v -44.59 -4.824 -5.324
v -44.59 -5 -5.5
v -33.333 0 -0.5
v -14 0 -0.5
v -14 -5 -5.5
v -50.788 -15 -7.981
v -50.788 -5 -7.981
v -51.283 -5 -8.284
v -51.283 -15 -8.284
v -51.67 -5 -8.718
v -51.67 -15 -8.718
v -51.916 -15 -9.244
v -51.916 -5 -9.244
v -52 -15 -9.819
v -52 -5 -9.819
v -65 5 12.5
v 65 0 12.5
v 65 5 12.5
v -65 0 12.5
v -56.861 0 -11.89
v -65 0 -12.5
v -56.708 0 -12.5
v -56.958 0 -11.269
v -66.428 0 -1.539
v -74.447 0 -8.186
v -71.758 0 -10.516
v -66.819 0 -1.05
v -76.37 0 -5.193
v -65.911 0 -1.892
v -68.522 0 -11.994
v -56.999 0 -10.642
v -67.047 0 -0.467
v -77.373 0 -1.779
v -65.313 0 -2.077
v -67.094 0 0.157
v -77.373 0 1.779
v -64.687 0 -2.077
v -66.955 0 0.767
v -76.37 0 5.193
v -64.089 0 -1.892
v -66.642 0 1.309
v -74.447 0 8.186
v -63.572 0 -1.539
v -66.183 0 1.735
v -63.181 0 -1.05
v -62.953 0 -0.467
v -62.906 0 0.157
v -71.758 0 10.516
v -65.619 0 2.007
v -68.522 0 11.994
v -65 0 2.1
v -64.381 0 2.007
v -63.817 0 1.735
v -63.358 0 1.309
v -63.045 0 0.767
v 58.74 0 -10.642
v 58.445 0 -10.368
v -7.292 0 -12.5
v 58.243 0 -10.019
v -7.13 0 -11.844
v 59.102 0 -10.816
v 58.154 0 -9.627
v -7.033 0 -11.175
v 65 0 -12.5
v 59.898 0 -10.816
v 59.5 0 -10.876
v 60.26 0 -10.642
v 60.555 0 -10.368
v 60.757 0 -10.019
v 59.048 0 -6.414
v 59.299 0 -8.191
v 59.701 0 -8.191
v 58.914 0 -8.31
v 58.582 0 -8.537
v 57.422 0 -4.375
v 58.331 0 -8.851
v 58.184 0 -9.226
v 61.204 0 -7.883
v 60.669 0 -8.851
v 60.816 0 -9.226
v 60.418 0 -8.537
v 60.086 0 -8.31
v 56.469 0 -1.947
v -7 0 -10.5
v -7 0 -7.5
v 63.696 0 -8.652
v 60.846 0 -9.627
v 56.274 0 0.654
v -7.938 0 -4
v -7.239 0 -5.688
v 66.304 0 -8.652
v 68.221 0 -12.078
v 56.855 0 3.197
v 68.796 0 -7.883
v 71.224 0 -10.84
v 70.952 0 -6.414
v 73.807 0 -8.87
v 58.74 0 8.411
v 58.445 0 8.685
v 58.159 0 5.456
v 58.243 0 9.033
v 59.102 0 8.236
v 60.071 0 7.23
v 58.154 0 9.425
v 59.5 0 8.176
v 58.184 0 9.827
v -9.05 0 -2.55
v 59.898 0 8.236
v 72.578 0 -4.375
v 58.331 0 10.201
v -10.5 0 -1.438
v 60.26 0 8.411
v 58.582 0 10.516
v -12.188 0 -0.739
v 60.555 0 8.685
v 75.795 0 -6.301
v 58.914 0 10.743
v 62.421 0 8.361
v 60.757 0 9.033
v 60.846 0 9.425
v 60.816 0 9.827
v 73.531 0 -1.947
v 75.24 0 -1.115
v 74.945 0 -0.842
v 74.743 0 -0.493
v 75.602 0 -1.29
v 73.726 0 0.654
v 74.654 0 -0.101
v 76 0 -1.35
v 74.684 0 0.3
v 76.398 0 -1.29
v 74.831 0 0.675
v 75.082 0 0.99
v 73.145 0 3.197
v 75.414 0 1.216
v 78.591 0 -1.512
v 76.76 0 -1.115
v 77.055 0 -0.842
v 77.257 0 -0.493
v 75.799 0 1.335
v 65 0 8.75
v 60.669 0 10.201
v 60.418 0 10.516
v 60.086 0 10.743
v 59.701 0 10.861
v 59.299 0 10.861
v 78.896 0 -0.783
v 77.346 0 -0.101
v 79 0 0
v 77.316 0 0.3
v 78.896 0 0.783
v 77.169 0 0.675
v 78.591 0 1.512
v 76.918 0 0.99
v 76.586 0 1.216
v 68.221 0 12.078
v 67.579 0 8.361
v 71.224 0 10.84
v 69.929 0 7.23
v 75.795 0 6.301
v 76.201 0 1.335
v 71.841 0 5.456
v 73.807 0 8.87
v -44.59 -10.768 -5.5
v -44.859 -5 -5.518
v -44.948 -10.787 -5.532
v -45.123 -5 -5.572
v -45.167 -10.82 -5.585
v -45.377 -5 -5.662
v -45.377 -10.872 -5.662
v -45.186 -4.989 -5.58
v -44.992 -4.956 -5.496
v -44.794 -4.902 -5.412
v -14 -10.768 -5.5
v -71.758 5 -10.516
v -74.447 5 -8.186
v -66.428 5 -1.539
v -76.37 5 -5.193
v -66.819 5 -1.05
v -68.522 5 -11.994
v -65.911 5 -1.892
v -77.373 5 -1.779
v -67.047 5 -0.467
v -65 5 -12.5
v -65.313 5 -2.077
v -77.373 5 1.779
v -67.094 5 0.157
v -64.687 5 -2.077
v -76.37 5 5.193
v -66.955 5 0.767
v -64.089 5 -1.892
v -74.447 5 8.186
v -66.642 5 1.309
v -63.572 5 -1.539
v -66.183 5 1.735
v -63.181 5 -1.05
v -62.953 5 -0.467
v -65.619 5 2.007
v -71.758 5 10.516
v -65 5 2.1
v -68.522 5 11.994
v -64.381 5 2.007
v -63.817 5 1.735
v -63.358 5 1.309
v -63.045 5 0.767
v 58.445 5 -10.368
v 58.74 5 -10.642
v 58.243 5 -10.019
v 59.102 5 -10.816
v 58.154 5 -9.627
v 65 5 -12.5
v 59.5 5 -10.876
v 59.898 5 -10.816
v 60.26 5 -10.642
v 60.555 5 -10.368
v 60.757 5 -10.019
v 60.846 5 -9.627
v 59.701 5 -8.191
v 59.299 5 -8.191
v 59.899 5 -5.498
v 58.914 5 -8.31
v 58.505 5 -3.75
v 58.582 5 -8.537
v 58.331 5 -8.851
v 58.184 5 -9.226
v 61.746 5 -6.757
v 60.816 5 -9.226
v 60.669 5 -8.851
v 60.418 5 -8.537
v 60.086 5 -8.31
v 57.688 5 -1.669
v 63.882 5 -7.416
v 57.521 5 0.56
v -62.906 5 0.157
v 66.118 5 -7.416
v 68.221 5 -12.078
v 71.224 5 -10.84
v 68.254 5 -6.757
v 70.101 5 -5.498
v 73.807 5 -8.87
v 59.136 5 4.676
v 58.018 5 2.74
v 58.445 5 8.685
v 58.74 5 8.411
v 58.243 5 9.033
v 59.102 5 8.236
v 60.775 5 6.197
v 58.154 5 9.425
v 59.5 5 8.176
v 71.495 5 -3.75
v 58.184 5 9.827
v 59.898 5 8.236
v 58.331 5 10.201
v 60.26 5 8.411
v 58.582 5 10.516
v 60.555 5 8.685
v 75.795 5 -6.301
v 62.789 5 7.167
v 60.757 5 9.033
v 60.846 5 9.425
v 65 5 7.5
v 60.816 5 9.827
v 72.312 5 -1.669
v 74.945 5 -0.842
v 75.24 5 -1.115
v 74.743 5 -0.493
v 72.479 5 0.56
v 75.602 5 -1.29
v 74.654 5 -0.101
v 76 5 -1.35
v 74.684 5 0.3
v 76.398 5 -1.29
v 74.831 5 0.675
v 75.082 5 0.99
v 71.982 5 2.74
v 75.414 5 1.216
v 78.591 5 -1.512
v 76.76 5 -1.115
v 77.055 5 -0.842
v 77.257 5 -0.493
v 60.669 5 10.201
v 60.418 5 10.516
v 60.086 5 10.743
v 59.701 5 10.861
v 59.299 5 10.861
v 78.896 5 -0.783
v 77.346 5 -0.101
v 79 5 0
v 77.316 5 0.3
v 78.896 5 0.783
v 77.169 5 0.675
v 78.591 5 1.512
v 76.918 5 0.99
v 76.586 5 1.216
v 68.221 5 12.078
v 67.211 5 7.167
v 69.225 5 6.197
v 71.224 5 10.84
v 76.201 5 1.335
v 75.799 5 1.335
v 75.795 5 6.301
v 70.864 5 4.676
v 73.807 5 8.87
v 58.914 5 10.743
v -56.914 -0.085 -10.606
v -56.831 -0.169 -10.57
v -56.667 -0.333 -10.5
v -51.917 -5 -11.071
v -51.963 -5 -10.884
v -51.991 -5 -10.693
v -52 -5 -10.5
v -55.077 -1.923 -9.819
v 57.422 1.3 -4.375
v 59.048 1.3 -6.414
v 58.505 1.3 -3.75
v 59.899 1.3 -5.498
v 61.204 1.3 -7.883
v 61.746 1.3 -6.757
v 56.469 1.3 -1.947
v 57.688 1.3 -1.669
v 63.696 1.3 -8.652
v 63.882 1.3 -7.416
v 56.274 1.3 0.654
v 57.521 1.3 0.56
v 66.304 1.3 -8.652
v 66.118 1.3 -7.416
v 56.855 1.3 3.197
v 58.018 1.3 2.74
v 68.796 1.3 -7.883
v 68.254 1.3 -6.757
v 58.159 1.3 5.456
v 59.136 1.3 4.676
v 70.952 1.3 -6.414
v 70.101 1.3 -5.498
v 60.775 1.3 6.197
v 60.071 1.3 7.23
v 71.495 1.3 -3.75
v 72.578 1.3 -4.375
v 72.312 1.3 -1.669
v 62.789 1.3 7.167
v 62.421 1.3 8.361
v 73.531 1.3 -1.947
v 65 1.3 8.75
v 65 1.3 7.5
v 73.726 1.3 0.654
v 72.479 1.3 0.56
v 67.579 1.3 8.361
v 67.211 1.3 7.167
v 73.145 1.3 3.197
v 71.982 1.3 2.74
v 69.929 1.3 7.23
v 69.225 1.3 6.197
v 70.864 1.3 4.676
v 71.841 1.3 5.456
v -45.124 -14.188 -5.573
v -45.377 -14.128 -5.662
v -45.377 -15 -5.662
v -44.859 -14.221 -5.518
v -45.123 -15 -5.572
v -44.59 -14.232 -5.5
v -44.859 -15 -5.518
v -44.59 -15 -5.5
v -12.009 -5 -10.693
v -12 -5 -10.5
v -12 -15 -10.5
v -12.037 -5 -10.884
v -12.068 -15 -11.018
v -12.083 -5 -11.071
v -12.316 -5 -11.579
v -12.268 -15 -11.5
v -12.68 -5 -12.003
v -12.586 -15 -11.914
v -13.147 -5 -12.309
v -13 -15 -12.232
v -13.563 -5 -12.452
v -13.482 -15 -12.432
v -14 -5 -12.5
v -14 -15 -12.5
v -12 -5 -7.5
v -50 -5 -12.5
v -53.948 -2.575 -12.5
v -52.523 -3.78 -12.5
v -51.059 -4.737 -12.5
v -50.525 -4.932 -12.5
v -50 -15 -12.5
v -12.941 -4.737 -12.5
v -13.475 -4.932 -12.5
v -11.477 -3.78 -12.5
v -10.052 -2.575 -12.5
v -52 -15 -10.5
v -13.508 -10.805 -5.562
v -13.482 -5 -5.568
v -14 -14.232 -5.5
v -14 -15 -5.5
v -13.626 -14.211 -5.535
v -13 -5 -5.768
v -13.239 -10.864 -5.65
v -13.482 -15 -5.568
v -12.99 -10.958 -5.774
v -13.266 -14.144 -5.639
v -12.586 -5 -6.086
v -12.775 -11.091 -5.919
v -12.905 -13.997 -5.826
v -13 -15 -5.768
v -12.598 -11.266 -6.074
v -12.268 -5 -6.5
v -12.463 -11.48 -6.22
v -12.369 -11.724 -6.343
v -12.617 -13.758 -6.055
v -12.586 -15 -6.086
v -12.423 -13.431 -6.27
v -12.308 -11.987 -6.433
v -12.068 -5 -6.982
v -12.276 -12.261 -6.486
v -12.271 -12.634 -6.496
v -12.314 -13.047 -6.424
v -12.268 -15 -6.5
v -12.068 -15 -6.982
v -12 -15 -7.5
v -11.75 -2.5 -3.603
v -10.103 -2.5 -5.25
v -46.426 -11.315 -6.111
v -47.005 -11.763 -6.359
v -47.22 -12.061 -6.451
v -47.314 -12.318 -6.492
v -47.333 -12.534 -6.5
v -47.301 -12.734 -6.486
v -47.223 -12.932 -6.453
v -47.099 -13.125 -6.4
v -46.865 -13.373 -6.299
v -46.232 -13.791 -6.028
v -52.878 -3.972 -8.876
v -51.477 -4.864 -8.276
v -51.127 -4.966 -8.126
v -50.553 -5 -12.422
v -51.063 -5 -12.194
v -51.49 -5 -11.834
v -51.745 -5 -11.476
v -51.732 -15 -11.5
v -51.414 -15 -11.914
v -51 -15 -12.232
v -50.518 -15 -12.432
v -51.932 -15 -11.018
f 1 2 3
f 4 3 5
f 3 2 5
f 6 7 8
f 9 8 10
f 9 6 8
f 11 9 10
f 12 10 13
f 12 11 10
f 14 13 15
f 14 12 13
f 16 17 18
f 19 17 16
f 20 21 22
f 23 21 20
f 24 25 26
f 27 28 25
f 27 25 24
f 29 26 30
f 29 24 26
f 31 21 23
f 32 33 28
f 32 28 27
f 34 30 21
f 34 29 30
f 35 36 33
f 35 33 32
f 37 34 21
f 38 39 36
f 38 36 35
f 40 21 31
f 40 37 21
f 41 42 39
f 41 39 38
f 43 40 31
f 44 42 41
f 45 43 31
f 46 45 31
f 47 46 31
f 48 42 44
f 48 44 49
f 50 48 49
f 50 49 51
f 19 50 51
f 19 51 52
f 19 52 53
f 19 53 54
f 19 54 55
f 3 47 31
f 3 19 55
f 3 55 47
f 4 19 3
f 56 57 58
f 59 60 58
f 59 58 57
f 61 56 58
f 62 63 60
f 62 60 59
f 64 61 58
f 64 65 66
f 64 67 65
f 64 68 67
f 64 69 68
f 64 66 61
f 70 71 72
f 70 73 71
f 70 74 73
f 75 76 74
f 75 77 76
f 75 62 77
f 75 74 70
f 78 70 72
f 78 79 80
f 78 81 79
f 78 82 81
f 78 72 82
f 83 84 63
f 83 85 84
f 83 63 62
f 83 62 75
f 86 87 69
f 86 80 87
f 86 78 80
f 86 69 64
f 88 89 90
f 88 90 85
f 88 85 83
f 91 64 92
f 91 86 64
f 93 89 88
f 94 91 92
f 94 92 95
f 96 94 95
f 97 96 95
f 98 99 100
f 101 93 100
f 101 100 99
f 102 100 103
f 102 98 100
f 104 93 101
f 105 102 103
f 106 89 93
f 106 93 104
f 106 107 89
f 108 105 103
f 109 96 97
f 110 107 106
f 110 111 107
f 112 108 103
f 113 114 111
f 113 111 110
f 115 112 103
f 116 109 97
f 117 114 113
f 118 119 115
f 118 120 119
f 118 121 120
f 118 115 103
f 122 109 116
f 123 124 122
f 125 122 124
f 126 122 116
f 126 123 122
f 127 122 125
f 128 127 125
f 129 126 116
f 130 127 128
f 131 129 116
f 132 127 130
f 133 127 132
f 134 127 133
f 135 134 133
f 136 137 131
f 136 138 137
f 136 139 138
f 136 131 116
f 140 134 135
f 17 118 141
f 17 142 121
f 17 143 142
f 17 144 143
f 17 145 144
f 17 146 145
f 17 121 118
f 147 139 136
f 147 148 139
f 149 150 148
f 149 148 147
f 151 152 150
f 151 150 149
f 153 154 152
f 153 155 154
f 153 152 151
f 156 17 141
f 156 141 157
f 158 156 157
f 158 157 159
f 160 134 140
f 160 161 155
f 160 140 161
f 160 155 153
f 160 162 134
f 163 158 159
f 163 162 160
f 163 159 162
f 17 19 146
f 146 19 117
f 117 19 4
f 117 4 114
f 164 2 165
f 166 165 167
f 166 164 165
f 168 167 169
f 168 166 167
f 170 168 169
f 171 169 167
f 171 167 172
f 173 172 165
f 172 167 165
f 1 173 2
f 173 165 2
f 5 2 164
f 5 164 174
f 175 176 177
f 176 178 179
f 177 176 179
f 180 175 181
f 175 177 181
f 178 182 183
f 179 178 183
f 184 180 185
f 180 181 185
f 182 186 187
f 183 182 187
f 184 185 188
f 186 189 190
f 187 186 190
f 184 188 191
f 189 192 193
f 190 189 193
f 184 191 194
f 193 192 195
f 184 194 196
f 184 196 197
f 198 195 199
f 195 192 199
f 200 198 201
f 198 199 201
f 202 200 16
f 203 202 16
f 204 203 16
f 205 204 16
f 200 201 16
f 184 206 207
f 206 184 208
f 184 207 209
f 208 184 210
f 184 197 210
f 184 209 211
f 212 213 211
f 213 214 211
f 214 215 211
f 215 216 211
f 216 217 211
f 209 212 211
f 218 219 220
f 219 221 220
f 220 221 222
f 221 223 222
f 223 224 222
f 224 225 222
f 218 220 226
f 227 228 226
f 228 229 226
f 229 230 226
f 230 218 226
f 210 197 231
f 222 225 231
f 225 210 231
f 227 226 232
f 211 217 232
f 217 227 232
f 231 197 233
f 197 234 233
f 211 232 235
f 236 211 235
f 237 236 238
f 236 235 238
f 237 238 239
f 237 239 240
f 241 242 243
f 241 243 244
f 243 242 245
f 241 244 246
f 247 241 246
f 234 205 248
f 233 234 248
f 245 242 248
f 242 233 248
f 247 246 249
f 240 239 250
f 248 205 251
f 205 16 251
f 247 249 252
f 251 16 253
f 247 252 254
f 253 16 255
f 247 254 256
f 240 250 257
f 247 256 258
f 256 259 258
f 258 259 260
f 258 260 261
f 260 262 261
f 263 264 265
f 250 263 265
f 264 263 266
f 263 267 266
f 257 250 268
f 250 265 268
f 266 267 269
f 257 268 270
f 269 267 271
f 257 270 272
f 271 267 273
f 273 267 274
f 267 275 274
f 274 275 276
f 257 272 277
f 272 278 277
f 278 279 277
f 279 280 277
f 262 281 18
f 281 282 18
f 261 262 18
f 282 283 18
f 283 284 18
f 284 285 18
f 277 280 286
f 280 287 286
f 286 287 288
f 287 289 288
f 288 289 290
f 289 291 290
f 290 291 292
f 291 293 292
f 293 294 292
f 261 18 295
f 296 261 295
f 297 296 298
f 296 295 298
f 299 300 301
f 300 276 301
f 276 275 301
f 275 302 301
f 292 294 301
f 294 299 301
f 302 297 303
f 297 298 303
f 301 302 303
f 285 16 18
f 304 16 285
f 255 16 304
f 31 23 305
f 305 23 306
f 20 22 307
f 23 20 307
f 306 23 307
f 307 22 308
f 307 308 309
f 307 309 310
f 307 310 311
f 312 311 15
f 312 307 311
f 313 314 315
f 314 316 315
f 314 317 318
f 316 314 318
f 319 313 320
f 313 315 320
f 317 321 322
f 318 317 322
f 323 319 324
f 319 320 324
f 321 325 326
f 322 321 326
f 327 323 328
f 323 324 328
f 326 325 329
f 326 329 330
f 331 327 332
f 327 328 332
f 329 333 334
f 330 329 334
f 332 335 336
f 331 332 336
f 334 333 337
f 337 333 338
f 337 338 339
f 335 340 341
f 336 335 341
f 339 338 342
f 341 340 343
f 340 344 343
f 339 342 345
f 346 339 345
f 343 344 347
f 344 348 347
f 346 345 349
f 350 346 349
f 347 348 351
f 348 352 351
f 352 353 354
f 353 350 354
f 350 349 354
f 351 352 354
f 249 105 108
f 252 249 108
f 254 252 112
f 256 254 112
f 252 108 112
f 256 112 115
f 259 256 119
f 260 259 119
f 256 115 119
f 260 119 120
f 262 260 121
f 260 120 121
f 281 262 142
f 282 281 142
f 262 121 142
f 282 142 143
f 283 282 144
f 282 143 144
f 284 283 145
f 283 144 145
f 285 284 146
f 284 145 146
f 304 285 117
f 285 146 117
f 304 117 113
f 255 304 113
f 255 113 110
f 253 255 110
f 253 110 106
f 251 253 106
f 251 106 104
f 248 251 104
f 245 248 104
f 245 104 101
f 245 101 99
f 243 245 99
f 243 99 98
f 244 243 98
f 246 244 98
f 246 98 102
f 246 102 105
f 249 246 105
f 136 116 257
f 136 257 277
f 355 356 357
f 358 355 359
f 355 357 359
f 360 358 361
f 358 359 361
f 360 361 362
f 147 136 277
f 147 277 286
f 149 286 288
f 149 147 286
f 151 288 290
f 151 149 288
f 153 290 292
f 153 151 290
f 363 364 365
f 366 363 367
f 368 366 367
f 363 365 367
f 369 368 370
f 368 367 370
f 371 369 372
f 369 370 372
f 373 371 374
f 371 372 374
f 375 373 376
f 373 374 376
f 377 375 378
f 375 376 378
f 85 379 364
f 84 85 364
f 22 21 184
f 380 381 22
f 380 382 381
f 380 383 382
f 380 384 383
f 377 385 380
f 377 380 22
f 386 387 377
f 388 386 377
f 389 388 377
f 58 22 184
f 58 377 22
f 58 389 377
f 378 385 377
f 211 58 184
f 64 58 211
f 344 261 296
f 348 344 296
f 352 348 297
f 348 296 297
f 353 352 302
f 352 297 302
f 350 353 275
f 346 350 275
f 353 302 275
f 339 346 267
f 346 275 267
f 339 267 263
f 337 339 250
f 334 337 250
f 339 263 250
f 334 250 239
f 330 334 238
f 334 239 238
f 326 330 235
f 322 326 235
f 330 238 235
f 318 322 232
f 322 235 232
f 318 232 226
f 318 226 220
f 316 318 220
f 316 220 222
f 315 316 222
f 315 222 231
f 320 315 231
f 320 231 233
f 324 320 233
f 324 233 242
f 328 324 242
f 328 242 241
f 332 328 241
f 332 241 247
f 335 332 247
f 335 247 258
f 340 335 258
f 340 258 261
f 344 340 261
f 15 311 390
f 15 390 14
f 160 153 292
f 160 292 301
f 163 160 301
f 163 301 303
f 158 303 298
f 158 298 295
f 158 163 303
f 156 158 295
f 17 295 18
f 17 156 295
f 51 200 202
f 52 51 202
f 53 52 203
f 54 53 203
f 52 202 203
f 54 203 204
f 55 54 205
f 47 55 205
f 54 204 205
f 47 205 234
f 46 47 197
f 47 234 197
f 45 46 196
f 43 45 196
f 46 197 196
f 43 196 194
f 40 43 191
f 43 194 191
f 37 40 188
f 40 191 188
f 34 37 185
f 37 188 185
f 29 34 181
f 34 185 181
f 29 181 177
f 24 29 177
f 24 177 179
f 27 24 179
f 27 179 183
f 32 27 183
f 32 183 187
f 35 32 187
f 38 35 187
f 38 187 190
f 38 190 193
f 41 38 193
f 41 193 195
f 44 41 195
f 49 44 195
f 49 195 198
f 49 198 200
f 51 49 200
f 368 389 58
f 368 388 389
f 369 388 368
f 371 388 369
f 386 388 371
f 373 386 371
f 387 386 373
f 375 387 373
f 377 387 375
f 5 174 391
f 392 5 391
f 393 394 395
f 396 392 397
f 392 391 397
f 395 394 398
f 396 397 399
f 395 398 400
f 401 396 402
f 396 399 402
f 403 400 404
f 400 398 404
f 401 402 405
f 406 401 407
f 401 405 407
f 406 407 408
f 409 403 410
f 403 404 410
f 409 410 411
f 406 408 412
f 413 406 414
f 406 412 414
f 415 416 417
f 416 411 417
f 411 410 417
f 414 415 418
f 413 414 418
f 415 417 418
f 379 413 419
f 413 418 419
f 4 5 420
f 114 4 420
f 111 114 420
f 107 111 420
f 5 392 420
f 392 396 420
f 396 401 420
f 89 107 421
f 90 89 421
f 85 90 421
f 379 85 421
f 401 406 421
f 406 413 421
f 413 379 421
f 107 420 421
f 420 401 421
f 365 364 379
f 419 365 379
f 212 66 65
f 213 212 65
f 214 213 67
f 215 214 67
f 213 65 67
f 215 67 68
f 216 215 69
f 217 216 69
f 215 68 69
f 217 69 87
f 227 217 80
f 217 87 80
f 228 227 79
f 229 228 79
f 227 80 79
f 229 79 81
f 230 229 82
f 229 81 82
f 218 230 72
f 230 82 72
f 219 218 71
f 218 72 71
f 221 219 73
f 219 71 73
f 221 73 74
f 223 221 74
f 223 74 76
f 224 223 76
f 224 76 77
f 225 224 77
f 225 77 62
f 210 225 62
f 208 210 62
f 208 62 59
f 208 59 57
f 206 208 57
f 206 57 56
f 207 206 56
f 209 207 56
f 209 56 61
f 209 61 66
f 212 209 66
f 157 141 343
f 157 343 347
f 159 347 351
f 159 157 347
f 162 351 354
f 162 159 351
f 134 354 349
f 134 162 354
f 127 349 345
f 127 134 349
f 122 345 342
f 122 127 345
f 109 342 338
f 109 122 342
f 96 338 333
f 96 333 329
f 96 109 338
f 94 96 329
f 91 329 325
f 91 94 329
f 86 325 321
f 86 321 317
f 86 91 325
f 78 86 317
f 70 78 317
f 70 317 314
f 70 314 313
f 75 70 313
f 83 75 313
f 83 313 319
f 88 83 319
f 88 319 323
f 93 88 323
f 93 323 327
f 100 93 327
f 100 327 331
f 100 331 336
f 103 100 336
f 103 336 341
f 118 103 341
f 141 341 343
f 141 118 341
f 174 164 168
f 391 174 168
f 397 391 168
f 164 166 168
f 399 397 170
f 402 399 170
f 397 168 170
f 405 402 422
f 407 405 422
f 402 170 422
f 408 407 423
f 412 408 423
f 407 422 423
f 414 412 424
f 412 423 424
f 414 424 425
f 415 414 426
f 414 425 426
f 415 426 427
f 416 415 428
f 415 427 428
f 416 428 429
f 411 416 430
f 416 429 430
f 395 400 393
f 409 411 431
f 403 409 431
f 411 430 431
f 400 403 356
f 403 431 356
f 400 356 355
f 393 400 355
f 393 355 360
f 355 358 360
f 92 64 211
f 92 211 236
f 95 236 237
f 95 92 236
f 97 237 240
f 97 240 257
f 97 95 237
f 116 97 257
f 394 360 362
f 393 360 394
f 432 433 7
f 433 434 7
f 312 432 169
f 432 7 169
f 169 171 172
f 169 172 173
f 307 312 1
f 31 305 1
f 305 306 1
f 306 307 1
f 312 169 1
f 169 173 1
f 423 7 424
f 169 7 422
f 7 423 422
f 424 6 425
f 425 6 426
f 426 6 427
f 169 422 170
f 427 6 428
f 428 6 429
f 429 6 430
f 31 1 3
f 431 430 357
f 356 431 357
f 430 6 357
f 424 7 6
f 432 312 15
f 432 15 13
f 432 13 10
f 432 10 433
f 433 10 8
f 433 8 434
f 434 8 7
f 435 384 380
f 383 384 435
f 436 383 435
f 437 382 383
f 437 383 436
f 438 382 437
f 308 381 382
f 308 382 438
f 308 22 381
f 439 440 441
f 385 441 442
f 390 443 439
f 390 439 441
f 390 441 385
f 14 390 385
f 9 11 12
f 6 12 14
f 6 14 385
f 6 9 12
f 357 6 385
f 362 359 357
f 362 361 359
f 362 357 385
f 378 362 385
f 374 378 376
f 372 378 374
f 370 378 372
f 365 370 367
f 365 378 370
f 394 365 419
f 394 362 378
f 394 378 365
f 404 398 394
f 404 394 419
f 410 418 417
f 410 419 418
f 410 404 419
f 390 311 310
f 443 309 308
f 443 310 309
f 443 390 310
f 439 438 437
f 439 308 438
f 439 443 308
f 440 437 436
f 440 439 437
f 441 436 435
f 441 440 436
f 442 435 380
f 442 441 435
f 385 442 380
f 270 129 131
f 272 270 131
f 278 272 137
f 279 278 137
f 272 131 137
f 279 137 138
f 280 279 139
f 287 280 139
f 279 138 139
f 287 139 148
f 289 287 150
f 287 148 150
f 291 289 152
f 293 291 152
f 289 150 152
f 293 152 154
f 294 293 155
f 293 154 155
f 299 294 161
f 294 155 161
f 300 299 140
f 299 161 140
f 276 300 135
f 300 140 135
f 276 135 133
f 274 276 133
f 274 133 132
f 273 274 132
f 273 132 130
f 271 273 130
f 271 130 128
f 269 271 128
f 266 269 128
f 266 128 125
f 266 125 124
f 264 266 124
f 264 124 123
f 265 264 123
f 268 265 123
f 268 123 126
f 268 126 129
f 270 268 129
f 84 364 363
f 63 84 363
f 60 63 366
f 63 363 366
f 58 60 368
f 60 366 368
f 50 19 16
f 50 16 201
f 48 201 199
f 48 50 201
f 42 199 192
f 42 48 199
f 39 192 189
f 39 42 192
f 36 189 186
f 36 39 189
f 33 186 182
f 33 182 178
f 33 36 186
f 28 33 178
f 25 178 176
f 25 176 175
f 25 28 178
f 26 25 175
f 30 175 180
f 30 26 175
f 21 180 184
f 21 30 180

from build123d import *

# Parameters (mm, degrees)
EXTRUDE_1_DEPTH     = 5
EXTRUDE_5_DEPTH     = 5
CUT_EXTRUDE_2_REACH = 82.139
SKETCH_7_R          = 7.5
SKETCH_8_R          = 8.75
CUT_EXTRUDE_3_DEPTH = 1.3
CUT_EXTRUDE_4_REACH = 82.139
SKETCH_9_R          = 1.35
CUT_EXTRUDE_5_REACH = 82.139
SKETCH_12_R         = 2.1
SKETCH_14_W         = 40
SKETCH_14_H         = 7
EXTRUDE_6_DEPTH     = 15
CHAMFER_1_SIZE      = 7
CHAMFER_1_SIZE2     = 3
CUT_EXTRUDE_6_REACH = 134.447
SKETCH_15_R         = 2
FILLET_3_R          = 2
CHAMFER_2_SIZE      = 5
CUT_EXTRUDE_7_DEPTH = 15


with BuildPart() as part:
    # 草图1 → 凸台-拉伸1 (new body)
    with BuildSketch(Plane(origin=(0, 0, 0), x_dir=(1, 0, 0), z_dir=(0, 1, 0))):
        with BuildLine():
            Line((-65, 12.5), (65, 12.5))
            ThreePointArc((65, 12.5), (77.5, 0), (65, -12.5))
            Line((65, -12.5), (-65, -12.5))
            ThreePointArc((-65, -12.5), (-77.5, 0), (-65, 12.5))
        make_face()
    extrude(amount=EXTRUDE_1_DEPTH)

    # 草图10 → 凸台-拉伸5 (add)
    with BuildSketch(Plane.XZ):
        with BuildLine():
            Line((75.795454545, -6.301441197), (78.590909091, -1.512345887))
            ThreePointArc((78.590909091, -1.512345887), (79, 0), (78.590909091, 1.512345887))
            Line((78.590909091, 1.512345887), (75.795454545, 6.301441197))
            Line((75.795454545, 6.301441197), (75.795454545, -6.301441197))
        make_face()
    extrude(amount=-EXTRUDE_5_DEPTH)

    # 草图7 → 切除-拉伸2 (cut, up to next)
    with BuildSketch(Plane(origin=(0, 5, 0), x_dir=(1, 0, 0), z_dir=(0, 1, 0)), mode=Mode.PRIVATE) as cut_extrude_2_sk1:
        with Locations(Location((65, 0, 0), (0, 0, 270))):
            Circle(SKETCH_7_R)
    cut_extrude_2_tool1 = extrude(cut_extrude_2_sk1.sketch, amount=-CUT_EXTRUDE_2_REACH, mode=Mode.PRIVATE) & part.part
    add(cut_extrude_2_tool1.solids().sort_by_distance((65, 5, 0))[0], mode=Mode.SUBTRACT)

    # 草图8 → 切除-拉伸3 (cut)
    with BuildSketch(Plane(origin=(0, 0, 0), x_dir=(1, 0, 0), z_dir=(0, 1, 0))):
        with Locations(Location((65, 0, 0), (0, 0, 270))):
            Circle(SKETCH_8_R)
    extrude(amount=CUT_EXTRUDE_3_DEPTH, mode=Mode.SUBTRACT)

    # 草图9 → 切除-拉伸4 (cut, up to next)
    with BuildSketch(Plane.XZ, mode=Mode.PRIVATE) as cut_extrude_4_sk1:
        with Locations(Location((59.5, 9.526279442, 0), (0, 0, 270))):
            Circle(SKETCH_9_R)
    cut_extrude_4_tool1 = extrude(cut_extrude_4_sk1.sketch, amount=-CUT_EXTRUDE_4_REACH, mode=Mode.PRIVATE) & part.part
    # 草图9 → 切除-拉伸4 (cut, up to next)
    with BuildSketch(Plane.XZ, mode=Mode.PRIVATE) as cut_extrude_4_sk2:
        with Locations(Location((76, 0, 0), (0, 0, 270))):
            Circle(SKETCH_9_R)
    cut_extrude_4_tool2 = extrude(cut_extrude_4_sk2.sketch, amount=-CUT_EXTRUDE_4_REACH, mode=Mode.PRIVATE) & part.part
    # 草图9 → 切除-拉伸4 (cut, up to next)
    with BuildSketch(Plane.XZ, mode=Mode.PRIVATE) as cut_extrude_4_sk3:
        with Locations(Location((59.5, -9.526279442, 0), (0, 0, 270))):
            Circle(SKETCH_9_R)
    cut_extrude_4_tool3 = extrude(cut_extrude_4_sk3.sketch, amount=-CUT_EXTRUDE_4_REACH, mode=Mode.PRIVATE) & part.part
    add(cut_extrude_4_tool1.solids().sort_by_distance((59.5, 0, 9.526279))[0], mode=Mode.SUBTRACT)
    add(cut_extrude_4_tool2.solids().sort_by_distance((76, 0, 0))[0], mode=Mode.SUBTRACT)
    add(cut_extrude_4_tool3.solids().sort_by_distance((59.5, 0, -9.526279))[0], mode=Mode.SUBTRACT)

    # 草图12 → 切除-拉伸5 (cut, up to next)
    with BuildSketch(Plane(origin=(0, 5, 0), x_dir=(1, 0, 0), z_dir=(0, 1, 0)), mode=Mode.PRIVATE) as cut_extrude_5_sk1:
        with Locations(Location((-65, 0, 0), (0, 0, 270))):
            Circle(SKETCH_12_R)
    cut_extrude_5_tool1 = extrude(cut_extrude_5_sk1.sketch, amount=-CUT_EXTRUDE_5_REACH, mode=Mode.PRIVATE) & part.part
    add(cut_extrude_5_tool1.solids().sort_by_distance((-65, 5, 0))[0], mode=Mode.SUBTRACT)

    # 草图14 → 凸台-拉伸6 (add)
    with BuildSketch(Plane.XZ):
        with Locations((-32, -9)):
            Rectangle(SKETCH_14_W, SKETCH_14_H)
    extrude(amount=EXTRUDE_6_DEPTH)

    # 倒角1
    chamfer_1_edges = [part.edges().sort_by_distance(p)[0] for p in [
        (-52, -7.5, -5.5),
    ]]
    chamfer_1_side = [part.faces().sort_by_distance(p)[0] for p in [
        (-32, -7.5, -5.5),
    ]]
    chamfer(chamfer_1_edges, length=CHAMFER_1_SIZE, length2=CHAMFER_1_SIZE2, reference=chamfer_1_side[0])

    # 草图15 → 切除-拉伸6 (cut, up to next)
    with BuildSketch(Plane.ZY.offset(52), mode=Mode.PRIVATE) as cut_extrude_6_sk1:
        with Locations((-4.5, -12.5)):
            Circle(SKETCH_15_R)
    cut_extrude_6_tool1 = extrude(cut_extrude_6_sk1.sketch, amount=-CUT_EXTRUDE_6_REACH, mode=Mode.PRIVATE) & part.part
    add(cut_extrude_6_tool1.solids().sort_by_distance((-52, -12.5, -4.5))[0], mode=Mode.SUBTRACT)

    # 圆角3
    fillet_3_edges = [part.edges().sort_by_distance(p)[0] for p in [
        (-52, -7.5, -8.5),
        (-52, -7.5, -12.5),
        (-45, -14.616025404, -5.5),
        (-45, -5.383974596, -5.5),
        (-12, -5.383974596, -5.5),
        (-12, -7.5, -12.5),
    ]]
    fillet(fillet_3_edges, radius=FILLET_3_R - 0.0001)  # a hair under: the kernel refuses the full size

    # 倒角2
    chamfer_2_edges = [part.edges().sort_by_distance(p)[0] for p in [
        (-52, 0, -10.159413188),
        (-48.082601766, 0, -6.821115043),
        (-29.294702561, 0, -5.5),
        (-12, 0, -9),
        (-51.6696987, 0, -8.717799408),
        (-51.414242852, 0, -11.914242852),
        (-44.99161676, 0, -5.540842512),
        (-12.585757148, 0, -6.085757148),
        (-12.585757148, 0, -11.914242852),
    ]]
    chamfer(chamfer_2_edges, length=CHAMFER_2_SIZE)

    # 草图16 → 切除-拉伸7 (cut)
    with BuildSketch(Plane.XZ.offset(15)):
        Polygon((-61.333333333, -12.5), (-33.333333333, -0.5), (-61.333333333, -0.5), align=None)
    extrude(amount=-CUT_EXTRUDE_7_DEPTH, mode=Mode.SUBTRACT)


solid = part.part
